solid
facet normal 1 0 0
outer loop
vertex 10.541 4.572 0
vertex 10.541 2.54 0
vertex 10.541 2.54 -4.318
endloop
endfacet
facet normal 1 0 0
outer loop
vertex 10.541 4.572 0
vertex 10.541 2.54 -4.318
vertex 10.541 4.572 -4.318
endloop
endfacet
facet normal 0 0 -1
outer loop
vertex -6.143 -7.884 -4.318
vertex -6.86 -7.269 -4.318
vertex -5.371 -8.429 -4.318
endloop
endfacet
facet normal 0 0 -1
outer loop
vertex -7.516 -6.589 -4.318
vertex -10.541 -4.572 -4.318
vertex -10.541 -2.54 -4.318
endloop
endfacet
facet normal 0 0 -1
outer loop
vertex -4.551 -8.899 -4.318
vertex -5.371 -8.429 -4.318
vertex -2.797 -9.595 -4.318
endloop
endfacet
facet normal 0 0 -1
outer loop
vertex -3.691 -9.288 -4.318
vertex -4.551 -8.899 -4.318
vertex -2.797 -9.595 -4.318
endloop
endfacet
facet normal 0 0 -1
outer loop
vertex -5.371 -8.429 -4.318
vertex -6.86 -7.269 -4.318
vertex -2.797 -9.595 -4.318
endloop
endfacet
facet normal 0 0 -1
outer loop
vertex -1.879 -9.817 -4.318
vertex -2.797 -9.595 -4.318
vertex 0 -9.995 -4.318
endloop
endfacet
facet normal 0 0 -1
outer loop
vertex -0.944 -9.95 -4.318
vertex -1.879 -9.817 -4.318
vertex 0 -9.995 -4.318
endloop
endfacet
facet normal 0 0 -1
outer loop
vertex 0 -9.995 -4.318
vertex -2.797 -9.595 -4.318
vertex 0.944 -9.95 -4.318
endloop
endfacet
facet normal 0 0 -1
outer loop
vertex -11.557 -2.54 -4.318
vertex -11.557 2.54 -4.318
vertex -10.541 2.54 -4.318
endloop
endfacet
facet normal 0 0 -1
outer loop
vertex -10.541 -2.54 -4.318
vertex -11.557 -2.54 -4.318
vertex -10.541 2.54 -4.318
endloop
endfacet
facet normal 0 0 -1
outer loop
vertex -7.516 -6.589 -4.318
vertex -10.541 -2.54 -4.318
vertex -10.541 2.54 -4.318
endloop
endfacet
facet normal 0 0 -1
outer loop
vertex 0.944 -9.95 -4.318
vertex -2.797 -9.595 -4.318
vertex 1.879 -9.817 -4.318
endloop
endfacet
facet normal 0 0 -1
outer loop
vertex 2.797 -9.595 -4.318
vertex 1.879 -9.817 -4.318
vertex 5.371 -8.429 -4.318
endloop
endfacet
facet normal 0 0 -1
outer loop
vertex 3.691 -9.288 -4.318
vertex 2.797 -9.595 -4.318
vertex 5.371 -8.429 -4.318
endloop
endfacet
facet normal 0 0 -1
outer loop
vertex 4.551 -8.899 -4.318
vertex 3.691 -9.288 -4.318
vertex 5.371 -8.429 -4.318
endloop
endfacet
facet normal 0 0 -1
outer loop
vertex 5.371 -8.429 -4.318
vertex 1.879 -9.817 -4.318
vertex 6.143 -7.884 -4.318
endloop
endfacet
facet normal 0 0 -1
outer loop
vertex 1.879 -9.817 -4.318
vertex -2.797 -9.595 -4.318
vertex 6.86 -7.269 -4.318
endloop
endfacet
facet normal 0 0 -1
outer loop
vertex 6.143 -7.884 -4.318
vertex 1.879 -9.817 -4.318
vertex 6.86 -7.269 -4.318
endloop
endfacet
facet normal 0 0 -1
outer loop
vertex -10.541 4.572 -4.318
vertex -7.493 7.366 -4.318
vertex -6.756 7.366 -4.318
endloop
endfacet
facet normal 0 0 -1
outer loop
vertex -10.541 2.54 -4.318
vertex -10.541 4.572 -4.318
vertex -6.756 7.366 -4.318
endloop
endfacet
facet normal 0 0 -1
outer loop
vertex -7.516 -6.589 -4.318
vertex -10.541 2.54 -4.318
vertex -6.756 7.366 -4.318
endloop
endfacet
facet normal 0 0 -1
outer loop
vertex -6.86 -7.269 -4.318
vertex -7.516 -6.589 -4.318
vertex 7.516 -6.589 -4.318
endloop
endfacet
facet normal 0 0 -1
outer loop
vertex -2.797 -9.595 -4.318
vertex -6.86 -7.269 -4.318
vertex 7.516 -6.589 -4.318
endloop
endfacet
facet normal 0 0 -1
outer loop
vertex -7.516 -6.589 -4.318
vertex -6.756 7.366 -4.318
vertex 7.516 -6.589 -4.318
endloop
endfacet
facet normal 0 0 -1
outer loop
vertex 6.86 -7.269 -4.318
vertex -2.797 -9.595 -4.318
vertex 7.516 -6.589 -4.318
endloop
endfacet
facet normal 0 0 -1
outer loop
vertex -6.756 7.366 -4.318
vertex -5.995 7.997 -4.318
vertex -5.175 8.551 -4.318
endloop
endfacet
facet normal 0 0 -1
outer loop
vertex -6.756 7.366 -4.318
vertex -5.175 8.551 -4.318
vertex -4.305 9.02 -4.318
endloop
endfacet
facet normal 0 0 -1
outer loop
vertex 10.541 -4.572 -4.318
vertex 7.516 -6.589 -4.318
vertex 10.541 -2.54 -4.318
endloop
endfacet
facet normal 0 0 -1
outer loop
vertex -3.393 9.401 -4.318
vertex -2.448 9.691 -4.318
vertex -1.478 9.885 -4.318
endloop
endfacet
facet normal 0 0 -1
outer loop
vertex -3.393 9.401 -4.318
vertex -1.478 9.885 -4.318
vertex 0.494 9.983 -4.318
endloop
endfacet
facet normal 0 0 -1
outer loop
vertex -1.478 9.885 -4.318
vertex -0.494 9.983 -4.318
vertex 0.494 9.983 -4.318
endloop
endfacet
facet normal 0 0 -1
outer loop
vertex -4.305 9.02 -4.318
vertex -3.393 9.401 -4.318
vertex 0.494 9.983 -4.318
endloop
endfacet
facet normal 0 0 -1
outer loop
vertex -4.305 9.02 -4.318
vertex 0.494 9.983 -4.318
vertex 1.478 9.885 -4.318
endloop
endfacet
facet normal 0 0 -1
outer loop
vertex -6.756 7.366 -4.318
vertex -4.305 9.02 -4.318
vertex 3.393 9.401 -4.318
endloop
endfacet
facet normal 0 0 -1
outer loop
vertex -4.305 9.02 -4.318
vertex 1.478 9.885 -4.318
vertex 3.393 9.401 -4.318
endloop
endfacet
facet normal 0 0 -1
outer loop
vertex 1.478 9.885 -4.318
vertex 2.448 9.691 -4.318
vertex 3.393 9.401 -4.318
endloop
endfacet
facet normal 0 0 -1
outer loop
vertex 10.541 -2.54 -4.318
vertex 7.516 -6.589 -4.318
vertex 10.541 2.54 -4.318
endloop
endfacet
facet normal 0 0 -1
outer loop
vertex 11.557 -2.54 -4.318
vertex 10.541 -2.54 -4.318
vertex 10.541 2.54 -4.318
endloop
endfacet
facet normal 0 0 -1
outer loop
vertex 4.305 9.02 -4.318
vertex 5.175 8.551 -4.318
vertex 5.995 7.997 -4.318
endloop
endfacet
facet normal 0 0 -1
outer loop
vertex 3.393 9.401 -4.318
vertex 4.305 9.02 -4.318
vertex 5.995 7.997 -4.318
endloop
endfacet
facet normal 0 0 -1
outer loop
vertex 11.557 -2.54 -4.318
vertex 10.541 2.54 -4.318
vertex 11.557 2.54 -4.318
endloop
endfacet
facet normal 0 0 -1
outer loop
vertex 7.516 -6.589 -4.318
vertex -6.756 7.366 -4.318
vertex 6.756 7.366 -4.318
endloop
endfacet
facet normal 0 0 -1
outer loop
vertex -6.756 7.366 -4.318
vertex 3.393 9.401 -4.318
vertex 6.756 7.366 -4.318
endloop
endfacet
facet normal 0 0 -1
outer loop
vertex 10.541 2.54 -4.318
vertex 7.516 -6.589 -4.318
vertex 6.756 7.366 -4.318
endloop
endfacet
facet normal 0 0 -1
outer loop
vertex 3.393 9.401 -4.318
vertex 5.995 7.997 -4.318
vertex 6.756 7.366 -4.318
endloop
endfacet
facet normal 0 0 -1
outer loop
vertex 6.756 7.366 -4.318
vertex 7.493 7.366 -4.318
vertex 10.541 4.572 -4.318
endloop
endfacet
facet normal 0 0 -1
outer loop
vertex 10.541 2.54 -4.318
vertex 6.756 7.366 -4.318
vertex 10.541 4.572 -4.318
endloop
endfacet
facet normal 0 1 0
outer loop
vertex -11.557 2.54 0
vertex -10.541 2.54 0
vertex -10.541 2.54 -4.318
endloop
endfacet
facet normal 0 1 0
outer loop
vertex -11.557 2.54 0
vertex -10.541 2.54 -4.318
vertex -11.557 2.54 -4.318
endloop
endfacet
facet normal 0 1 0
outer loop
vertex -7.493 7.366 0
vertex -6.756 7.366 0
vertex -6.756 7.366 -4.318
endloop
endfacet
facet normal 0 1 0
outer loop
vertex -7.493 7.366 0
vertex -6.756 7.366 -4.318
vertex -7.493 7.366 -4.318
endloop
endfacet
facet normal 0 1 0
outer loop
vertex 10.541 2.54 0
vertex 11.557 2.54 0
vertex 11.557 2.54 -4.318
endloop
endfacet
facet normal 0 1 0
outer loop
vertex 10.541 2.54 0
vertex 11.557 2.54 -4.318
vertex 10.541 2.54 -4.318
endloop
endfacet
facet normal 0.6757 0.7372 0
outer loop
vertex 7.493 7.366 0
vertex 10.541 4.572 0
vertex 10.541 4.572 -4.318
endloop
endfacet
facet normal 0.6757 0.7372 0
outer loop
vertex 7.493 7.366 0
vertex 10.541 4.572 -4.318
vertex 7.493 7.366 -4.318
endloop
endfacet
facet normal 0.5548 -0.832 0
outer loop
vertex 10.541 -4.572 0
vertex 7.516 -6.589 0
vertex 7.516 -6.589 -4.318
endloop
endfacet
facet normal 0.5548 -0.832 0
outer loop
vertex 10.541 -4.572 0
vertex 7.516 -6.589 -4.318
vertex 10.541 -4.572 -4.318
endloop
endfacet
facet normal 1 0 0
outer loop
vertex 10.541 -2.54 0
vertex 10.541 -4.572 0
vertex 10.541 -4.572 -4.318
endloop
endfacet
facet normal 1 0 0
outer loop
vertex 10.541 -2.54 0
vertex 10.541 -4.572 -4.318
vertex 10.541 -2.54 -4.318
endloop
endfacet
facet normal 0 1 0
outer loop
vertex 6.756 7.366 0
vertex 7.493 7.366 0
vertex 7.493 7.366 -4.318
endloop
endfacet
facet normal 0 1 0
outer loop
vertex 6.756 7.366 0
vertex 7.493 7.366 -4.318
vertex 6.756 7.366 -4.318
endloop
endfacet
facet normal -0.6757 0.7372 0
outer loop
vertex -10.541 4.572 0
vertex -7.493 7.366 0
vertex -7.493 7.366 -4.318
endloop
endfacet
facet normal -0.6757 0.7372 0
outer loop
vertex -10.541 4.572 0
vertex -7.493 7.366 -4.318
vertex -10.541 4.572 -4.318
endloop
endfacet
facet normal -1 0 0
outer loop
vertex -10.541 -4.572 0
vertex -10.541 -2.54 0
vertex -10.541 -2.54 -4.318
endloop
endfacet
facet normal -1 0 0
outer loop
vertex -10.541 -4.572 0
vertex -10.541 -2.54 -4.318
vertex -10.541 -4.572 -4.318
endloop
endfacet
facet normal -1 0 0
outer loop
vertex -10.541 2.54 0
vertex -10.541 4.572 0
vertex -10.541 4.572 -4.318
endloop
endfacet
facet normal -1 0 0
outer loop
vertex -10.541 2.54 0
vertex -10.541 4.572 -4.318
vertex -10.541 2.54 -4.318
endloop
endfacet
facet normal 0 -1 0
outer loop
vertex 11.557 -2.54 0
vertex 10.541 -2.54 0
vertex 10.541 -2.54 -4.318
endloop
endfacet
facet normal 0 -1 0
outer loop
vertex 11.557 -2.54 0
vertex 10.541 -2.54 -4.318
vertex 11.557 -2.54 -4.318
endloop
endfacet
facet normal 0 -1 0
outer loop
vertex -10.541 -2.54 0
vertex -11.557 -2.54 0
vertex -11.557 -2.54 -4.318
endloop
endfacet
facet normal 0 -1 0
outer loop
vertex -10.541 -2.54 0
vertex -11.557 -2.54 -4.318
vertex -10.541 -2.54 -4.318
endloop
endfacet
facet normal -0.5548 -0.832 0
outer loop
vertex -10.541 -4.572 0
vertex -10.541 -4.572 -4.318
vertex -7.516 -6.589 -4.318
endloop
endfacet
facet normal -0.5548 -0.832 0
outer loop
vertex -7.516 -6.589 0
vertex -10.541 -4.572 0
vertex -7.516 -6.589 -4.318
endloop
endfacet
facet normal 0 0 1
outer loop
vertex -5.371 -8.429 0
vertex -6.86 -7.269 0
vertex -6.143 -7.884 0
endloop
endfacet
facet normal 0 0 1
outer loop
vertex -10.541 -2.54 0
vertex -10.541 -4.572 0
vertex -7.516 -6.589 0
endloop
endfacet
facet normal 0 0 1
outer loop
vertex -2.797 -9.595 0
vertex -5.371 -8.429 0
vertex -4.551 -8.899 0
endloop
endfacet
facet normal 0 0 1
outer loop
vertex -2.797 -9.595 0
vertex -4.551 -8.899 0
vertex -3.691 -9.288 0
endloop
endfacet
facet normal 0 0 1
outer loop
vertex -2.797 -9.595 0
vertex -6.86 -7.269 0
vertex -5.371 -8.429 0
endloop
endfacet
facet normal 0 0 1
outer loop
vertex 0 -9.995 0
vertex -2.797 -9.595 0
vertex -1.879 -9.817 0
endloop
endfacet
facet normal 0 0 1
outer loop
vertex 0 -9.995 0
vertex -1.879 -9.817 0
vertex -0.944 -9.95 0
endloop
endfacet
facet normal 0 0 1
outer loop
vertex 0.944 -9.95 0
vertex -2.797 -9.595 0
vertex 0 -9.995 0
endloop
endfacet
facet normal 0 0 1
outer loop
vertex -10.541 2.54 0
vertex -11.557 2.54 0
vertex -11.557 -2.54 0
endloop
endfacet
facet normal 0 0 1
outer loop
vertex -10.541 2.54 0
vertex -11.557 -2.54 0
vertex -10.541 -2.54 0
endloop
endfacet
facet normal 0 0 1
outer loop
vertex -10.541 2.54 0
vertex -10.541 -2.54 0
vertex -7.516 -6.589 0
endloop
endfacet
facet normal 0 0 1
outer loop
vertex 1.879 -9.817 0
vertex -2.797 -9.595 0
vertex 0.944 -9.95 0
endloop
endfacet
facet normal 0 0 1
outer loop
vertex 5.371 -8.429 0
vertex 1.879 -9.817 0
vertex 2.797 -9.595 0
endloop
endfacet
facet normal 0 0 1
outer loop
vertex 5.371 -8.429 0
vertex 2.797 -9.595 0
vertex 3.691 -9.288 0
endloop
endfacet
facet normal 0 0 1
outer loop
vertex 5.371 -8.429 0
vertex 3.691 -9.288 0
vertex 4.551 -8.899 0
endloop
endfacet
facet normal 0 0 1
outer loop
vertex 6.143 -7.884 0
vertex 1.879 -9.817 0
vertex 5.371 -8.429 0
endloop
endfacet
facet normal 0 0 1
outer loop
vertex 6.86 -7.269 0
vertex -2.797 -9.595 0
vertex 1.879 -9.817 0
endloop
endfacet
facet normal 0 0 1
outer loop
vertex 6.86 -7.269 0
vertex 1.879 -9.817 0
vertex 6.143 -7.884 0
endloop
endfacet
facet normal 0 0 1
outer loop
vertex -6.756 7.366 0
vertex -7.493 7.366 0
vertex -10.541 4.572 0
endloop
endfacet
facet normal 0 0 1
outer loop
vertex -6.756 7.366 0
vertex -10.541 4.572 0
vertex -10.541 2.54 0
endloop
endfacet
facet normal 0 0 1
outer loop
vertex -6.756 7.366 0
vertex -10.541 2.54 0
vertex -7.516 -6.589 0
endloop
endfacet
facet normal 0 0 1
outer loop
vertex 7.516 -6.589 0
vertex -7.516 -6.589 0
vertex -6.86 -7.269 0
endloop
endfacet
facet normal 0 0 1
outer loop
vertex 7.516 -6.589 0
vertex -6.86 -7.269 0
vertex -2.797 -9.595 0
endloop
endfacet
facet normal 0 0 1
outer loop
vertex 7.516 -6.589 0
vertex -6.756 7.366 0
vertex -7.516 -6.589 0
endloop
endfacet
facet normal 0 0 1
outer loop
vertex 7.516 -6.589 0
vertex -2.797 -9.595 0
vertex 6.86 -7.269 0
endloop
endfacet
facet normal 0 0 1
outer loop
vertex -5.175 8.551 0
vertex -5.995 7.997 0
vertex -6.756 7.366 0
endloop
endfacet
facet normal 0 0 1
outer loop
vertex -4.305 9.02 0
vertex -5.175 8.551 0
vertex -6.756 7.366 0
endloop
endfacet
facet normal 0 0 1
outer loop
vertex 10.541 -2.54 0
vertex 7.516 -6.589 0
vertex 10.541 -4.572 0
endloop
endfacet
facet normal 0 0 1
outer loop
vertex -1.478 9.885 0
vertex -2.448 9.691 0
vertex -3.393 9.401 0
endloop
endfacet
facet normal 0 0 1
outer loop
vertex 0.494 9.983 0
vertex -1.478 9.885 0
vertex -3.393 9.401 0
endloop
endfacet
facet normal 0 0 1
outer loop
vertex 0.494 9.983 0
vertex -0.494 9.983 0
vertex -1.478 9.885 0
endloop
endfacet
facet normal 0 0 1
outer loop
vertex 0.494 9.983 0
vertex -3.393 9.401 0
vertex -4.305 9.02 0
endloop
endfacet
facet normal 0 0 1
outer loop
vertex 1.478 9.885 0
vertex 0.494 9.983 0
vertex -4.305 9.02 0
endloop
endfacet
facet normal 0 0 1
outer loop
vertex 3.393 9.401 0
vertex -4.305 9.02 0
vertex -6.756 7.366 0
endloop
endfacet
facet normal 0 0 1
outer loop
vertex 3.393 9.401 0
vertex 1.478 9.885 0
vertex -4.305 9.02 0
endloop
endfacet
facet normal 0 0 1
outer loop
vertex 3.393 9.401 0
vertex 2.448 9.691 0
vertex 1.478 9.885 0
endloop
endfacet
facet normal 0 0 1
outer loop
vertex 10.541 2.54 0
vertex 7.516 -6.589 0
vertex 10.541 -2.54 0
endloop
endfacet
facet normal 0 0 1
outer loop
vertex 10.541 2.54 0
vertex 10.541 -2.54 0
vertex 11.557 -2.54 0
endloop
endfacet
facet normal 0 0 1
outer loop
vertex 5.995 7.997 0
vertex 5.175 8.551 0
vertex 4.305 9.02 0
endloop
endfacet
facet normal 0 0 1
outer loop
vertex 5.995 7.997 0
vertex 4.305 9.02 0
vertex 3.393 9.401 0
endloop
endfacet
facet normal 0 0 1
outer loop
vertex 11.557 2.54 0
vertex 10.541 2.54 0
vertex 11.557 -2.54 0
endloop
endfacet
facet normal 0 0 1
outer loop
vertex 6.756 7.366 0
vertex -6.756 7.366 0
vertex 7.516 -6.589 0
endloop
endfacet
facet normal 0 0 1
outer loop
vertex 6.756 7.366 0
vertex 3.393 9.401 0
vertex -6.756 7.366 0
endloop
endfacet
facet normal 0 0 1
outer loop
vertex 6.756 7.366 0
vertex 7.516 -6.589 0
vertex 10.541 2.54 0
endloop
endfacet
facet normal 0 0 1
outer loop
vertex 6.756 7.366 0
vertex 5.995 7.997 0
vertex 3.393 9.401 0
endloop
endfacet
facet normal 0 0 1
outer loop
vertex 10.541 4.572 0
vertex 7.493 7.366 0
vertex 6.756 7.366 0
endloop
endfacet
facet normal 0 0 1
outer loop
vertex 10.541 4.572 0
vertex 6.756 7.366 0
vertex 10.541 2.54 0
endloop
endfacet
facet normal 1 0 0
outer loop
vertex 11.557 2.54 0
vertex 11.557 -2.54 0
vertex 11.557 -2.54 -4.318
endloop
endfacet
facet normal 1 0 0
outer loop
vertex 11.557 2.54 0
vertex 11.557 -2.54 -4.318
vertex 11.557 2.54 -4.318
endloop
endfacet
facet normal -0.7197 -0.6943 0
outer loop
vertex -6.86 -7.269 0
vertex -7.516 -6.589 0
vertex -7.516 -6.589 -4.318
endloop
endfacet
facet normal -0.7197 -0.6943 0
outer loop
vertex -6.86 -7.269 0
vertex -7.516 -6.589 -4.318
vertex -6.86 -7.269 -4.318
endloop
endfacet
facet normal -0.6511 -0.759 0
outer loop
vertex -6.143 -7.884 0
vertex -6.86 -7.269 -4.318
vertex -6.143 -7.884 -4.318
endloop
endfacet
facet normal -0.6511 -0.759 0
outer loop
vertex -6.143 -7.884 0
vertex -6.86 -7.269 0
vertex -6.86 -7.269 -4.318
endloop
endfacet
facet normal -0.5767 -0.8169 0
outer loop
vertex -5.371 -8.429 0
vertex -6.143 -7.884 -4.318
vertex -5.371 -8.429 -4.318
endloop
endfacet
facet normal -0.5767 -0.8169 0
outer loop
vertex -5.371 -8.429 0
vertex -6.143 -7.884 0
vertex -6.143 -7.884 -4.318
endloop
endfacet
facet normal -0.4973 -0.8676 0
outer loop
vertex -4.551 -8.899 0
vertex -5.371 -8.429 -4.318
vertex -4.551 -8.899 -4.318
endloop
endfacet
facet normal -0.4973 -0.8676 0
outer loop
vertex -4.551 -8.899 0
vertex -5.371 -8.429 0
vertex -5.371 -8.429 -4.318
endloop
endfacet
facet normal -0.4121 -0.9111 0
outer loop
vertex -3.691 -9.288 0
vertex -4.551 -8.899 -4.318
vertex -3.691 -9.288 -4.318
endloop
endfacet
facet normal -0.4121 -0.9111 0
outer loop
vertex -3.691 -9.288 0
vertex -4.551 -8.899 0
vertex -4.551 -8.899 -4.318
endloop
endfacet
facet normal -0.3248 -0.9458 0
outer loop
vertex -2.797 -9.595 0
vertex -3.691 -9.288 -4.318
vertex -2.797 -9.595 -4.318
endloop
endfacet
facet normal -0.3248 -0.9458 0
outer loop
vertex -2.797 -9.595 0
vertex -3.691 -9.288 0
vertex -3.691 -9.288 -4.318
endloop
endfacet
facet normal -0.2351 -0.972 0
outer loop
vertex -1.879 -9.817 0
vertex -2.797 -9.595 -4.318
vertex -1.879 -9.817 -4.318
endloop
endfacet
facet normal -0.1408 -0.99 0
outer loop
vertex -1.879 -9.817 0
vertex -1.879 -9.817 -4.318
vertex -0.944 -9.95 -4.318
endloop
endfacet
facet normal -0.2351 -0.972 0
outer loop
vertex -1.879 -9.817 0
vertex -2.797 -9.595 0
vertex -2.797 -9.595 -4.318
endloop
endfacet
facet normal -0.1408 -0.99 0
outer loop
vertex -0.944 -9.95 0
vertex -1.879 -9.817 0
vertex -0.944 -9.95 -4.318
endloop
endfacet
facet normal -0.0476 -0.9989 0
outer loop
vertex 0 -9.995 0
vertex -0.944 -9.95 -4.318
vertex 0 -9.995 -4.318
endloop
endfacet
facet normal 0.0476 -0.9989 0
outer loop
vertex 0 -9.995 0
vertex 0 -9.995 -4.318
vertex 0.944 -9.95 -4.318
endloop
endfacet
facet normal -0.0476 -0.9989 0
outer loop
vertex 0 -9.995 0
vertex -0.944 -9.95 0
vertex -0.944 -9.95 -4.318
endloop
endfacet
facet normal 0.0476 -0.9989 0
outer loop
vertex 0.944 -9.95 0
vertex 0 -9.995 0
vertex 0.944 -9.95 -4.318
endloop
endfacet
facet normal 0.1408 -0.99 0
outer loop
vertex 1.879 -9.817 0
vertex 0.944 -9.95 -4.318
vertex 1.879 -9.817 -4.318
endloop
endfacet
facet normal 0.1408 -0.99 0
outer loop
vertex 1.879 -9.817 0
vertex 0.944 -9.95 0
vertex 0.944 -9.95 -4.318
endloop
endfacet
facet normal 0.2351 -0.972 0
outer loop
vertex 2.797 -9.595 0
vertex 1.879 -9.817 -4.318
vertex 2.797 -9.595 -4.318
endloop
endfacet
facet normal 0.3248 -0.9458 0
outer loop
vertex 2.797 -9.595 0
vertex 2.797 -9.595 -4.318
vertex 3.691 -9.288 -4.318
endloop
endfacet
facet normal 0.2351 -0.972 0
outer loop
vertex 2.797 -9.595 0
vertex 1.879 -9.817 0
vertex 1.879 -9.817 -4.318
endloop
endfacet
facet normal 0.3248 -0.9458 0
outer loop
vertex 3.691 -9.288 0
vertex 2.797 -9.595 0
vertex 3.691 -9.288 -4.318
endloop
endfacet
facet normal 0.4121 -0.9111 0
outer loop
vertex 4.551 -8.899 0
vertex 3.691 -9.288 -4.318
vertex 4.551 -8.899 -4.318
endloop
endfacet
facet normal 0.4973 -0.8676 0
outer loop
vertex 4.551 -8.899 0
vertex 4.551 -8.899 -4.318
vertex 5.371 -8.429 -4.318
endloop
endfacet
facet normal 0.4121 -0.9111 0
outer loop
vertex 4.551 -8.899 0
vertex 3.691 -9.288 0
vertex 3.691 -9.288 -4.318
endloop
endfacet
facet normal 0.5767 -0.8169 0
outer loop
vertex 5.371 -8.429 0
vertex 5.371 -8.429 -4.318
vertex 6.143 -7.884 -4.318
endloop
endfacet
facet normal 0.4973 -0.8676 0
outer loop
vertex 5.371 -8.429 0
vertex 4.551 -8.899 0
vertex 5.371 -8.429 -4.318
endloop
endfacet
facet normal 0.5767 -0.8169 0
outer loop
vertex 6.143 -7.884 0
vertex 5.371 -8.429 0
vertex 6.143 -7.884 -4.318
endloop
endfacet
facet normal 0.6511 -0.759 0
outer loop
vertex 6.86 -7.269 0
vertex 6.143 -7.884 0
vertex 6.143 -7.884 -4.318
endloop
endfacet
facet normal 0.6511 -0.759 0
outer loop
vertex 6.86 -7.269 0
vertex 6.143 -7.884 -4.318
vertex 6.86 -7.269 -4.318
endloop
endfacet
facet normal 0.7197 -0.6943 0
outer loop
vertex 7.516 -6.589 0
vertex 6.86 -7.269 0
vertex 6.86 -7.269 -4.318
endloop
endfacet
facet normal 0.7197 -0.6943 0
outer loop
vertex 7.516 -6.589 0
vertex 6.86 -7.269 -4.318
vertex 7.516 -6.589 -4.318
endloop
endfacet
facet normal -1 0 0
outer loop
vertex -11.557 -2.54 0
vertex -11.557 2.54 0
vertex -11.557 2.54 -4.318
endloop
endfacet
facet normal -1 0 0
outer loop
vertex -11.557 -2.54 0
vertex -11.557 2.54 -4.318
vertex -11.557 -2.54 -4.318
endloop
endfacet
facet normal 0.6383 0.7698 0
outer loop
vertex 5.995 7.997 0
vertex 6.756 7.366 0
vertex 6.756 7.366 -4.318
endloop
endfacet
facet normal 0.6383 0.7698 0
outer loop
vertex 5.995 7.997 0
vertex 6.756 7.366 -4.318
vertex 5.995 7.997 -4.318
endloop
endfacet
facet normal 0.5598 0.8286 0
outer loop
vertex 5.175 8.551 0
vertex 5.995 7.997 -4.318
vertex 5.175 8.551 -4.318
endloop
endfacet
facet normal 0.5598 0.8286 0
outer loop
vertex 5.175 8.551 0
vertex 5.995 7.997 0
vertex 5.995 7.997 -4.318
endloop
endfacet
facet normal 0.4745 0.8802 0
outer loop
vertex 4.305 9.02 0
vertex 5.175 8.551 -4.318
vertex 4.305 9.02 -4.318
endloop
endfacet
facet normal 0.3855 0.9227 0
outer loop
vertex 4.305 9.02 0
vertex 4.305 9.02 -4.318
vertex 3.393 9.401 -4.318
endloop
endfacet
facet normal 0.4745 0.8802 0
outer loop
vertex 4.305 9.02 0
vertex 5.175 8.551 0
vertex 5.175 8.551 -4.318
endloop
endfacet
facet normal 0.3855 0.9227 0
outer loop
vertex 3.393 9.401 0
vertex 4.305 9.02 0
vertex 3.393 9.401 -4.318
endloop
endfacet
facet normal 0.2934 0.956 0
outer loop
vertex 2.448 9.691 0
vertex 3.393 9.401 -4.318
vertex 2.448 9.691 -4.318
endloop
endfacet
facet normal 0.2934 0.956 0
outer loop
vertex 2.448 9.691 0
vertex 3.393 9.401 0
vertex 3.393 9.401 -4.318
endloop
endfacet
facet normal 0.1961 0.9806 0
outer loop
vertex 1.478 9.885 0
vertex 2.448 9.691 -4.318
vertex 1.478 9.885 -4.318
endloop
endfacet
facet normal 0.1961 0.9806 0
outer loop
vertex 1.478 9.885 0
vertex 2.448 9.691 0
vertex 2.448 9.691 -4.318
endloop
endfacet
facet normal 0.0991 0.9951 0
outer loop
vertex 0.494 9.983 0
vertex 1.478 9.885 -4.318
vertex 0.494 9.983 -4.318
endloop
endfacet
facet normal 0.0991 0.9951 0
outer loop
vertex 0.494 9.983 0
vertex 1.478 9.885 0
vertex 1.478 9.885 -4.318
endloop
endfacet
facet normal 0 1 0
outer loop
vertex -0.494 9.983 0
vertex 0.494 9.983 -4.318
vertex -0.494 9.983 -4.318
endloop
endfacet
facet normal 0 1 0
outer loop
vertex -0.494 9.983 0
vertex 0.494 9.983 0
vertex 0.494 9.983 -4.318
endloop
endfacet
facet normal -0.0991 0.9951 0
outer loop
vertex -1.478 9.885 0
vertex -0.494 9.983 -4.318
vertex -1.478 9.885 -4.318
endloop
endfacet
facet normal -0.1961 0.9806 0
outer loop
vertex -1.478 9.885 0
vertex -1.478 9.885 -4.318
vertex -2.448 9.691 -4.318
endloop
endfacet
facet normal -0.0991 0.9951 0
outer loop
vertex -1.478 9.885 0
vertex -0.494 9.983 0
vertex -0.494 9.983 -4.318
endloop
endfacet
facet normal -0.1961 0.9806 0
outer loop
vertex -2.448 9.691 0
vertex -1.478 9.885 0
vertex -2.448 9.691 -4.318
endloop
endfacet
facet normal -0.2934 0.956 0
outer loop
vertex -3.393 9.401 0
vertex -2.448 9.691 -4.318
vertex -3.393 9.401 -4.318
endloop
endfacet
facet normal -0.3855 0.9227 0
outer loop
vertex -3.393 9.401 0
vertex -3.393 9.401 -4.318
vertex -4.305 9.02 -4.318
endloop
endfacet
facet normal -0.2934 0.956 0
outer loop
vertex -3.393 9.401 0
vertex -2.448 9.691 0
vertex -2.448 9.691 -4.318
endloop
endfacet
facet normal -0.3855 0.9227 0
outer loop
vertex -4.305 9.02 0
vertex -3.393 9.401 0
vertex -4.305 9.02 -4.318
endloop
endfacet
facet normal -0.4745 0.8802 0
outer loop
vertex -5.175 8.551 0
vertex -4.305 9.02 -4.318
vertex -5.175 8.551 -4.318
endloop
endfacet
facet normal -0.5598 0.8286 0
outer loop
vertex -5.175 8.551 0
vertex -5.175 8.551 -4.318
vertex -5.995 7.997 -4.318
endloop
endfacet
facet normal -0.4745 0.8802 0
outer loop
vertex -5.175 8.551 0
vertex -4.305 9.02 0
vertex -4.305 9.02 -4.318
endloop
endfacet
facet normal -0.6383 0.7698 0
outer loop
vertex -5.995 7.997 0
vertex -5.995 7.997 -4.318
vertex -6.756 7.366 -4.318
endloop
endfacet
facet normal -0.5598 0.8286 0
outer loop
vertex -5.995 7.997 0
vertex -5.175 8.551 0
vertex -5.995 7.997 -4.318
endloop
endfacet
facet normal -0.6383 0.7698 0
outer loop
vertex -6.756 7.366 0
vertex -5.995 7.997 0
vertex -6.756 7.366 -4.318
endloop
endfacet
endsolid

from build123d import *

# Parameters (mm, degrees)
F1_DEPTH = 4.318


with BuildPart() as f1:
    # F0 (on Top) → F1 (new body)
    with BuildSketch(Plane.XY):
        Polygon((-10.541, 2.54), (-11.557, 2.54), (-11.557, -2.54), (-10.541, -2.54), (-10.541, -4.572), (-7.515558, -6.588961), (-5.588, -7.874), (0, -7.874), (5.588, -7.874), (7.515558, -6.588961), (10.541, -4.572), (10.541, -2.54), (11.557, -2.54), (11.557, 2.54), (10.541, 2.54), (10.541, 4.572), (7.493, 7.366), (6.755743, 7.366), (0, 7.366), (-6.755743, 7.366), (-7.493, 7.366), (-10.541, 4.572), align=None)
        with BuildLine():
            ThreePointArc((6.755743, 7.366), (0, 9.9949), (-6.755743, 7.366))
            Line((-6.755743, 7.366), (0, 7.366))
            Line((0, 7.366), (6.755743, 7.366))
        make_face()
        with BuildLine():
            Line((-5.588, -7.874), (-7.515558, -6.588961))
            ThreePointArc((-7.515558, -6.588961), (0, -9.9949), (7.515558, -6.588961))
            Line((7.515558, -6.588961), (5.588, -7.874))
            Line((5.588, -7.874), (0, -7.874))
            Line((0, -7.874), (-5.588, -7.874))
        make_face()
    extrude(amount=-F1_DEPTH)


solid = f1.part
